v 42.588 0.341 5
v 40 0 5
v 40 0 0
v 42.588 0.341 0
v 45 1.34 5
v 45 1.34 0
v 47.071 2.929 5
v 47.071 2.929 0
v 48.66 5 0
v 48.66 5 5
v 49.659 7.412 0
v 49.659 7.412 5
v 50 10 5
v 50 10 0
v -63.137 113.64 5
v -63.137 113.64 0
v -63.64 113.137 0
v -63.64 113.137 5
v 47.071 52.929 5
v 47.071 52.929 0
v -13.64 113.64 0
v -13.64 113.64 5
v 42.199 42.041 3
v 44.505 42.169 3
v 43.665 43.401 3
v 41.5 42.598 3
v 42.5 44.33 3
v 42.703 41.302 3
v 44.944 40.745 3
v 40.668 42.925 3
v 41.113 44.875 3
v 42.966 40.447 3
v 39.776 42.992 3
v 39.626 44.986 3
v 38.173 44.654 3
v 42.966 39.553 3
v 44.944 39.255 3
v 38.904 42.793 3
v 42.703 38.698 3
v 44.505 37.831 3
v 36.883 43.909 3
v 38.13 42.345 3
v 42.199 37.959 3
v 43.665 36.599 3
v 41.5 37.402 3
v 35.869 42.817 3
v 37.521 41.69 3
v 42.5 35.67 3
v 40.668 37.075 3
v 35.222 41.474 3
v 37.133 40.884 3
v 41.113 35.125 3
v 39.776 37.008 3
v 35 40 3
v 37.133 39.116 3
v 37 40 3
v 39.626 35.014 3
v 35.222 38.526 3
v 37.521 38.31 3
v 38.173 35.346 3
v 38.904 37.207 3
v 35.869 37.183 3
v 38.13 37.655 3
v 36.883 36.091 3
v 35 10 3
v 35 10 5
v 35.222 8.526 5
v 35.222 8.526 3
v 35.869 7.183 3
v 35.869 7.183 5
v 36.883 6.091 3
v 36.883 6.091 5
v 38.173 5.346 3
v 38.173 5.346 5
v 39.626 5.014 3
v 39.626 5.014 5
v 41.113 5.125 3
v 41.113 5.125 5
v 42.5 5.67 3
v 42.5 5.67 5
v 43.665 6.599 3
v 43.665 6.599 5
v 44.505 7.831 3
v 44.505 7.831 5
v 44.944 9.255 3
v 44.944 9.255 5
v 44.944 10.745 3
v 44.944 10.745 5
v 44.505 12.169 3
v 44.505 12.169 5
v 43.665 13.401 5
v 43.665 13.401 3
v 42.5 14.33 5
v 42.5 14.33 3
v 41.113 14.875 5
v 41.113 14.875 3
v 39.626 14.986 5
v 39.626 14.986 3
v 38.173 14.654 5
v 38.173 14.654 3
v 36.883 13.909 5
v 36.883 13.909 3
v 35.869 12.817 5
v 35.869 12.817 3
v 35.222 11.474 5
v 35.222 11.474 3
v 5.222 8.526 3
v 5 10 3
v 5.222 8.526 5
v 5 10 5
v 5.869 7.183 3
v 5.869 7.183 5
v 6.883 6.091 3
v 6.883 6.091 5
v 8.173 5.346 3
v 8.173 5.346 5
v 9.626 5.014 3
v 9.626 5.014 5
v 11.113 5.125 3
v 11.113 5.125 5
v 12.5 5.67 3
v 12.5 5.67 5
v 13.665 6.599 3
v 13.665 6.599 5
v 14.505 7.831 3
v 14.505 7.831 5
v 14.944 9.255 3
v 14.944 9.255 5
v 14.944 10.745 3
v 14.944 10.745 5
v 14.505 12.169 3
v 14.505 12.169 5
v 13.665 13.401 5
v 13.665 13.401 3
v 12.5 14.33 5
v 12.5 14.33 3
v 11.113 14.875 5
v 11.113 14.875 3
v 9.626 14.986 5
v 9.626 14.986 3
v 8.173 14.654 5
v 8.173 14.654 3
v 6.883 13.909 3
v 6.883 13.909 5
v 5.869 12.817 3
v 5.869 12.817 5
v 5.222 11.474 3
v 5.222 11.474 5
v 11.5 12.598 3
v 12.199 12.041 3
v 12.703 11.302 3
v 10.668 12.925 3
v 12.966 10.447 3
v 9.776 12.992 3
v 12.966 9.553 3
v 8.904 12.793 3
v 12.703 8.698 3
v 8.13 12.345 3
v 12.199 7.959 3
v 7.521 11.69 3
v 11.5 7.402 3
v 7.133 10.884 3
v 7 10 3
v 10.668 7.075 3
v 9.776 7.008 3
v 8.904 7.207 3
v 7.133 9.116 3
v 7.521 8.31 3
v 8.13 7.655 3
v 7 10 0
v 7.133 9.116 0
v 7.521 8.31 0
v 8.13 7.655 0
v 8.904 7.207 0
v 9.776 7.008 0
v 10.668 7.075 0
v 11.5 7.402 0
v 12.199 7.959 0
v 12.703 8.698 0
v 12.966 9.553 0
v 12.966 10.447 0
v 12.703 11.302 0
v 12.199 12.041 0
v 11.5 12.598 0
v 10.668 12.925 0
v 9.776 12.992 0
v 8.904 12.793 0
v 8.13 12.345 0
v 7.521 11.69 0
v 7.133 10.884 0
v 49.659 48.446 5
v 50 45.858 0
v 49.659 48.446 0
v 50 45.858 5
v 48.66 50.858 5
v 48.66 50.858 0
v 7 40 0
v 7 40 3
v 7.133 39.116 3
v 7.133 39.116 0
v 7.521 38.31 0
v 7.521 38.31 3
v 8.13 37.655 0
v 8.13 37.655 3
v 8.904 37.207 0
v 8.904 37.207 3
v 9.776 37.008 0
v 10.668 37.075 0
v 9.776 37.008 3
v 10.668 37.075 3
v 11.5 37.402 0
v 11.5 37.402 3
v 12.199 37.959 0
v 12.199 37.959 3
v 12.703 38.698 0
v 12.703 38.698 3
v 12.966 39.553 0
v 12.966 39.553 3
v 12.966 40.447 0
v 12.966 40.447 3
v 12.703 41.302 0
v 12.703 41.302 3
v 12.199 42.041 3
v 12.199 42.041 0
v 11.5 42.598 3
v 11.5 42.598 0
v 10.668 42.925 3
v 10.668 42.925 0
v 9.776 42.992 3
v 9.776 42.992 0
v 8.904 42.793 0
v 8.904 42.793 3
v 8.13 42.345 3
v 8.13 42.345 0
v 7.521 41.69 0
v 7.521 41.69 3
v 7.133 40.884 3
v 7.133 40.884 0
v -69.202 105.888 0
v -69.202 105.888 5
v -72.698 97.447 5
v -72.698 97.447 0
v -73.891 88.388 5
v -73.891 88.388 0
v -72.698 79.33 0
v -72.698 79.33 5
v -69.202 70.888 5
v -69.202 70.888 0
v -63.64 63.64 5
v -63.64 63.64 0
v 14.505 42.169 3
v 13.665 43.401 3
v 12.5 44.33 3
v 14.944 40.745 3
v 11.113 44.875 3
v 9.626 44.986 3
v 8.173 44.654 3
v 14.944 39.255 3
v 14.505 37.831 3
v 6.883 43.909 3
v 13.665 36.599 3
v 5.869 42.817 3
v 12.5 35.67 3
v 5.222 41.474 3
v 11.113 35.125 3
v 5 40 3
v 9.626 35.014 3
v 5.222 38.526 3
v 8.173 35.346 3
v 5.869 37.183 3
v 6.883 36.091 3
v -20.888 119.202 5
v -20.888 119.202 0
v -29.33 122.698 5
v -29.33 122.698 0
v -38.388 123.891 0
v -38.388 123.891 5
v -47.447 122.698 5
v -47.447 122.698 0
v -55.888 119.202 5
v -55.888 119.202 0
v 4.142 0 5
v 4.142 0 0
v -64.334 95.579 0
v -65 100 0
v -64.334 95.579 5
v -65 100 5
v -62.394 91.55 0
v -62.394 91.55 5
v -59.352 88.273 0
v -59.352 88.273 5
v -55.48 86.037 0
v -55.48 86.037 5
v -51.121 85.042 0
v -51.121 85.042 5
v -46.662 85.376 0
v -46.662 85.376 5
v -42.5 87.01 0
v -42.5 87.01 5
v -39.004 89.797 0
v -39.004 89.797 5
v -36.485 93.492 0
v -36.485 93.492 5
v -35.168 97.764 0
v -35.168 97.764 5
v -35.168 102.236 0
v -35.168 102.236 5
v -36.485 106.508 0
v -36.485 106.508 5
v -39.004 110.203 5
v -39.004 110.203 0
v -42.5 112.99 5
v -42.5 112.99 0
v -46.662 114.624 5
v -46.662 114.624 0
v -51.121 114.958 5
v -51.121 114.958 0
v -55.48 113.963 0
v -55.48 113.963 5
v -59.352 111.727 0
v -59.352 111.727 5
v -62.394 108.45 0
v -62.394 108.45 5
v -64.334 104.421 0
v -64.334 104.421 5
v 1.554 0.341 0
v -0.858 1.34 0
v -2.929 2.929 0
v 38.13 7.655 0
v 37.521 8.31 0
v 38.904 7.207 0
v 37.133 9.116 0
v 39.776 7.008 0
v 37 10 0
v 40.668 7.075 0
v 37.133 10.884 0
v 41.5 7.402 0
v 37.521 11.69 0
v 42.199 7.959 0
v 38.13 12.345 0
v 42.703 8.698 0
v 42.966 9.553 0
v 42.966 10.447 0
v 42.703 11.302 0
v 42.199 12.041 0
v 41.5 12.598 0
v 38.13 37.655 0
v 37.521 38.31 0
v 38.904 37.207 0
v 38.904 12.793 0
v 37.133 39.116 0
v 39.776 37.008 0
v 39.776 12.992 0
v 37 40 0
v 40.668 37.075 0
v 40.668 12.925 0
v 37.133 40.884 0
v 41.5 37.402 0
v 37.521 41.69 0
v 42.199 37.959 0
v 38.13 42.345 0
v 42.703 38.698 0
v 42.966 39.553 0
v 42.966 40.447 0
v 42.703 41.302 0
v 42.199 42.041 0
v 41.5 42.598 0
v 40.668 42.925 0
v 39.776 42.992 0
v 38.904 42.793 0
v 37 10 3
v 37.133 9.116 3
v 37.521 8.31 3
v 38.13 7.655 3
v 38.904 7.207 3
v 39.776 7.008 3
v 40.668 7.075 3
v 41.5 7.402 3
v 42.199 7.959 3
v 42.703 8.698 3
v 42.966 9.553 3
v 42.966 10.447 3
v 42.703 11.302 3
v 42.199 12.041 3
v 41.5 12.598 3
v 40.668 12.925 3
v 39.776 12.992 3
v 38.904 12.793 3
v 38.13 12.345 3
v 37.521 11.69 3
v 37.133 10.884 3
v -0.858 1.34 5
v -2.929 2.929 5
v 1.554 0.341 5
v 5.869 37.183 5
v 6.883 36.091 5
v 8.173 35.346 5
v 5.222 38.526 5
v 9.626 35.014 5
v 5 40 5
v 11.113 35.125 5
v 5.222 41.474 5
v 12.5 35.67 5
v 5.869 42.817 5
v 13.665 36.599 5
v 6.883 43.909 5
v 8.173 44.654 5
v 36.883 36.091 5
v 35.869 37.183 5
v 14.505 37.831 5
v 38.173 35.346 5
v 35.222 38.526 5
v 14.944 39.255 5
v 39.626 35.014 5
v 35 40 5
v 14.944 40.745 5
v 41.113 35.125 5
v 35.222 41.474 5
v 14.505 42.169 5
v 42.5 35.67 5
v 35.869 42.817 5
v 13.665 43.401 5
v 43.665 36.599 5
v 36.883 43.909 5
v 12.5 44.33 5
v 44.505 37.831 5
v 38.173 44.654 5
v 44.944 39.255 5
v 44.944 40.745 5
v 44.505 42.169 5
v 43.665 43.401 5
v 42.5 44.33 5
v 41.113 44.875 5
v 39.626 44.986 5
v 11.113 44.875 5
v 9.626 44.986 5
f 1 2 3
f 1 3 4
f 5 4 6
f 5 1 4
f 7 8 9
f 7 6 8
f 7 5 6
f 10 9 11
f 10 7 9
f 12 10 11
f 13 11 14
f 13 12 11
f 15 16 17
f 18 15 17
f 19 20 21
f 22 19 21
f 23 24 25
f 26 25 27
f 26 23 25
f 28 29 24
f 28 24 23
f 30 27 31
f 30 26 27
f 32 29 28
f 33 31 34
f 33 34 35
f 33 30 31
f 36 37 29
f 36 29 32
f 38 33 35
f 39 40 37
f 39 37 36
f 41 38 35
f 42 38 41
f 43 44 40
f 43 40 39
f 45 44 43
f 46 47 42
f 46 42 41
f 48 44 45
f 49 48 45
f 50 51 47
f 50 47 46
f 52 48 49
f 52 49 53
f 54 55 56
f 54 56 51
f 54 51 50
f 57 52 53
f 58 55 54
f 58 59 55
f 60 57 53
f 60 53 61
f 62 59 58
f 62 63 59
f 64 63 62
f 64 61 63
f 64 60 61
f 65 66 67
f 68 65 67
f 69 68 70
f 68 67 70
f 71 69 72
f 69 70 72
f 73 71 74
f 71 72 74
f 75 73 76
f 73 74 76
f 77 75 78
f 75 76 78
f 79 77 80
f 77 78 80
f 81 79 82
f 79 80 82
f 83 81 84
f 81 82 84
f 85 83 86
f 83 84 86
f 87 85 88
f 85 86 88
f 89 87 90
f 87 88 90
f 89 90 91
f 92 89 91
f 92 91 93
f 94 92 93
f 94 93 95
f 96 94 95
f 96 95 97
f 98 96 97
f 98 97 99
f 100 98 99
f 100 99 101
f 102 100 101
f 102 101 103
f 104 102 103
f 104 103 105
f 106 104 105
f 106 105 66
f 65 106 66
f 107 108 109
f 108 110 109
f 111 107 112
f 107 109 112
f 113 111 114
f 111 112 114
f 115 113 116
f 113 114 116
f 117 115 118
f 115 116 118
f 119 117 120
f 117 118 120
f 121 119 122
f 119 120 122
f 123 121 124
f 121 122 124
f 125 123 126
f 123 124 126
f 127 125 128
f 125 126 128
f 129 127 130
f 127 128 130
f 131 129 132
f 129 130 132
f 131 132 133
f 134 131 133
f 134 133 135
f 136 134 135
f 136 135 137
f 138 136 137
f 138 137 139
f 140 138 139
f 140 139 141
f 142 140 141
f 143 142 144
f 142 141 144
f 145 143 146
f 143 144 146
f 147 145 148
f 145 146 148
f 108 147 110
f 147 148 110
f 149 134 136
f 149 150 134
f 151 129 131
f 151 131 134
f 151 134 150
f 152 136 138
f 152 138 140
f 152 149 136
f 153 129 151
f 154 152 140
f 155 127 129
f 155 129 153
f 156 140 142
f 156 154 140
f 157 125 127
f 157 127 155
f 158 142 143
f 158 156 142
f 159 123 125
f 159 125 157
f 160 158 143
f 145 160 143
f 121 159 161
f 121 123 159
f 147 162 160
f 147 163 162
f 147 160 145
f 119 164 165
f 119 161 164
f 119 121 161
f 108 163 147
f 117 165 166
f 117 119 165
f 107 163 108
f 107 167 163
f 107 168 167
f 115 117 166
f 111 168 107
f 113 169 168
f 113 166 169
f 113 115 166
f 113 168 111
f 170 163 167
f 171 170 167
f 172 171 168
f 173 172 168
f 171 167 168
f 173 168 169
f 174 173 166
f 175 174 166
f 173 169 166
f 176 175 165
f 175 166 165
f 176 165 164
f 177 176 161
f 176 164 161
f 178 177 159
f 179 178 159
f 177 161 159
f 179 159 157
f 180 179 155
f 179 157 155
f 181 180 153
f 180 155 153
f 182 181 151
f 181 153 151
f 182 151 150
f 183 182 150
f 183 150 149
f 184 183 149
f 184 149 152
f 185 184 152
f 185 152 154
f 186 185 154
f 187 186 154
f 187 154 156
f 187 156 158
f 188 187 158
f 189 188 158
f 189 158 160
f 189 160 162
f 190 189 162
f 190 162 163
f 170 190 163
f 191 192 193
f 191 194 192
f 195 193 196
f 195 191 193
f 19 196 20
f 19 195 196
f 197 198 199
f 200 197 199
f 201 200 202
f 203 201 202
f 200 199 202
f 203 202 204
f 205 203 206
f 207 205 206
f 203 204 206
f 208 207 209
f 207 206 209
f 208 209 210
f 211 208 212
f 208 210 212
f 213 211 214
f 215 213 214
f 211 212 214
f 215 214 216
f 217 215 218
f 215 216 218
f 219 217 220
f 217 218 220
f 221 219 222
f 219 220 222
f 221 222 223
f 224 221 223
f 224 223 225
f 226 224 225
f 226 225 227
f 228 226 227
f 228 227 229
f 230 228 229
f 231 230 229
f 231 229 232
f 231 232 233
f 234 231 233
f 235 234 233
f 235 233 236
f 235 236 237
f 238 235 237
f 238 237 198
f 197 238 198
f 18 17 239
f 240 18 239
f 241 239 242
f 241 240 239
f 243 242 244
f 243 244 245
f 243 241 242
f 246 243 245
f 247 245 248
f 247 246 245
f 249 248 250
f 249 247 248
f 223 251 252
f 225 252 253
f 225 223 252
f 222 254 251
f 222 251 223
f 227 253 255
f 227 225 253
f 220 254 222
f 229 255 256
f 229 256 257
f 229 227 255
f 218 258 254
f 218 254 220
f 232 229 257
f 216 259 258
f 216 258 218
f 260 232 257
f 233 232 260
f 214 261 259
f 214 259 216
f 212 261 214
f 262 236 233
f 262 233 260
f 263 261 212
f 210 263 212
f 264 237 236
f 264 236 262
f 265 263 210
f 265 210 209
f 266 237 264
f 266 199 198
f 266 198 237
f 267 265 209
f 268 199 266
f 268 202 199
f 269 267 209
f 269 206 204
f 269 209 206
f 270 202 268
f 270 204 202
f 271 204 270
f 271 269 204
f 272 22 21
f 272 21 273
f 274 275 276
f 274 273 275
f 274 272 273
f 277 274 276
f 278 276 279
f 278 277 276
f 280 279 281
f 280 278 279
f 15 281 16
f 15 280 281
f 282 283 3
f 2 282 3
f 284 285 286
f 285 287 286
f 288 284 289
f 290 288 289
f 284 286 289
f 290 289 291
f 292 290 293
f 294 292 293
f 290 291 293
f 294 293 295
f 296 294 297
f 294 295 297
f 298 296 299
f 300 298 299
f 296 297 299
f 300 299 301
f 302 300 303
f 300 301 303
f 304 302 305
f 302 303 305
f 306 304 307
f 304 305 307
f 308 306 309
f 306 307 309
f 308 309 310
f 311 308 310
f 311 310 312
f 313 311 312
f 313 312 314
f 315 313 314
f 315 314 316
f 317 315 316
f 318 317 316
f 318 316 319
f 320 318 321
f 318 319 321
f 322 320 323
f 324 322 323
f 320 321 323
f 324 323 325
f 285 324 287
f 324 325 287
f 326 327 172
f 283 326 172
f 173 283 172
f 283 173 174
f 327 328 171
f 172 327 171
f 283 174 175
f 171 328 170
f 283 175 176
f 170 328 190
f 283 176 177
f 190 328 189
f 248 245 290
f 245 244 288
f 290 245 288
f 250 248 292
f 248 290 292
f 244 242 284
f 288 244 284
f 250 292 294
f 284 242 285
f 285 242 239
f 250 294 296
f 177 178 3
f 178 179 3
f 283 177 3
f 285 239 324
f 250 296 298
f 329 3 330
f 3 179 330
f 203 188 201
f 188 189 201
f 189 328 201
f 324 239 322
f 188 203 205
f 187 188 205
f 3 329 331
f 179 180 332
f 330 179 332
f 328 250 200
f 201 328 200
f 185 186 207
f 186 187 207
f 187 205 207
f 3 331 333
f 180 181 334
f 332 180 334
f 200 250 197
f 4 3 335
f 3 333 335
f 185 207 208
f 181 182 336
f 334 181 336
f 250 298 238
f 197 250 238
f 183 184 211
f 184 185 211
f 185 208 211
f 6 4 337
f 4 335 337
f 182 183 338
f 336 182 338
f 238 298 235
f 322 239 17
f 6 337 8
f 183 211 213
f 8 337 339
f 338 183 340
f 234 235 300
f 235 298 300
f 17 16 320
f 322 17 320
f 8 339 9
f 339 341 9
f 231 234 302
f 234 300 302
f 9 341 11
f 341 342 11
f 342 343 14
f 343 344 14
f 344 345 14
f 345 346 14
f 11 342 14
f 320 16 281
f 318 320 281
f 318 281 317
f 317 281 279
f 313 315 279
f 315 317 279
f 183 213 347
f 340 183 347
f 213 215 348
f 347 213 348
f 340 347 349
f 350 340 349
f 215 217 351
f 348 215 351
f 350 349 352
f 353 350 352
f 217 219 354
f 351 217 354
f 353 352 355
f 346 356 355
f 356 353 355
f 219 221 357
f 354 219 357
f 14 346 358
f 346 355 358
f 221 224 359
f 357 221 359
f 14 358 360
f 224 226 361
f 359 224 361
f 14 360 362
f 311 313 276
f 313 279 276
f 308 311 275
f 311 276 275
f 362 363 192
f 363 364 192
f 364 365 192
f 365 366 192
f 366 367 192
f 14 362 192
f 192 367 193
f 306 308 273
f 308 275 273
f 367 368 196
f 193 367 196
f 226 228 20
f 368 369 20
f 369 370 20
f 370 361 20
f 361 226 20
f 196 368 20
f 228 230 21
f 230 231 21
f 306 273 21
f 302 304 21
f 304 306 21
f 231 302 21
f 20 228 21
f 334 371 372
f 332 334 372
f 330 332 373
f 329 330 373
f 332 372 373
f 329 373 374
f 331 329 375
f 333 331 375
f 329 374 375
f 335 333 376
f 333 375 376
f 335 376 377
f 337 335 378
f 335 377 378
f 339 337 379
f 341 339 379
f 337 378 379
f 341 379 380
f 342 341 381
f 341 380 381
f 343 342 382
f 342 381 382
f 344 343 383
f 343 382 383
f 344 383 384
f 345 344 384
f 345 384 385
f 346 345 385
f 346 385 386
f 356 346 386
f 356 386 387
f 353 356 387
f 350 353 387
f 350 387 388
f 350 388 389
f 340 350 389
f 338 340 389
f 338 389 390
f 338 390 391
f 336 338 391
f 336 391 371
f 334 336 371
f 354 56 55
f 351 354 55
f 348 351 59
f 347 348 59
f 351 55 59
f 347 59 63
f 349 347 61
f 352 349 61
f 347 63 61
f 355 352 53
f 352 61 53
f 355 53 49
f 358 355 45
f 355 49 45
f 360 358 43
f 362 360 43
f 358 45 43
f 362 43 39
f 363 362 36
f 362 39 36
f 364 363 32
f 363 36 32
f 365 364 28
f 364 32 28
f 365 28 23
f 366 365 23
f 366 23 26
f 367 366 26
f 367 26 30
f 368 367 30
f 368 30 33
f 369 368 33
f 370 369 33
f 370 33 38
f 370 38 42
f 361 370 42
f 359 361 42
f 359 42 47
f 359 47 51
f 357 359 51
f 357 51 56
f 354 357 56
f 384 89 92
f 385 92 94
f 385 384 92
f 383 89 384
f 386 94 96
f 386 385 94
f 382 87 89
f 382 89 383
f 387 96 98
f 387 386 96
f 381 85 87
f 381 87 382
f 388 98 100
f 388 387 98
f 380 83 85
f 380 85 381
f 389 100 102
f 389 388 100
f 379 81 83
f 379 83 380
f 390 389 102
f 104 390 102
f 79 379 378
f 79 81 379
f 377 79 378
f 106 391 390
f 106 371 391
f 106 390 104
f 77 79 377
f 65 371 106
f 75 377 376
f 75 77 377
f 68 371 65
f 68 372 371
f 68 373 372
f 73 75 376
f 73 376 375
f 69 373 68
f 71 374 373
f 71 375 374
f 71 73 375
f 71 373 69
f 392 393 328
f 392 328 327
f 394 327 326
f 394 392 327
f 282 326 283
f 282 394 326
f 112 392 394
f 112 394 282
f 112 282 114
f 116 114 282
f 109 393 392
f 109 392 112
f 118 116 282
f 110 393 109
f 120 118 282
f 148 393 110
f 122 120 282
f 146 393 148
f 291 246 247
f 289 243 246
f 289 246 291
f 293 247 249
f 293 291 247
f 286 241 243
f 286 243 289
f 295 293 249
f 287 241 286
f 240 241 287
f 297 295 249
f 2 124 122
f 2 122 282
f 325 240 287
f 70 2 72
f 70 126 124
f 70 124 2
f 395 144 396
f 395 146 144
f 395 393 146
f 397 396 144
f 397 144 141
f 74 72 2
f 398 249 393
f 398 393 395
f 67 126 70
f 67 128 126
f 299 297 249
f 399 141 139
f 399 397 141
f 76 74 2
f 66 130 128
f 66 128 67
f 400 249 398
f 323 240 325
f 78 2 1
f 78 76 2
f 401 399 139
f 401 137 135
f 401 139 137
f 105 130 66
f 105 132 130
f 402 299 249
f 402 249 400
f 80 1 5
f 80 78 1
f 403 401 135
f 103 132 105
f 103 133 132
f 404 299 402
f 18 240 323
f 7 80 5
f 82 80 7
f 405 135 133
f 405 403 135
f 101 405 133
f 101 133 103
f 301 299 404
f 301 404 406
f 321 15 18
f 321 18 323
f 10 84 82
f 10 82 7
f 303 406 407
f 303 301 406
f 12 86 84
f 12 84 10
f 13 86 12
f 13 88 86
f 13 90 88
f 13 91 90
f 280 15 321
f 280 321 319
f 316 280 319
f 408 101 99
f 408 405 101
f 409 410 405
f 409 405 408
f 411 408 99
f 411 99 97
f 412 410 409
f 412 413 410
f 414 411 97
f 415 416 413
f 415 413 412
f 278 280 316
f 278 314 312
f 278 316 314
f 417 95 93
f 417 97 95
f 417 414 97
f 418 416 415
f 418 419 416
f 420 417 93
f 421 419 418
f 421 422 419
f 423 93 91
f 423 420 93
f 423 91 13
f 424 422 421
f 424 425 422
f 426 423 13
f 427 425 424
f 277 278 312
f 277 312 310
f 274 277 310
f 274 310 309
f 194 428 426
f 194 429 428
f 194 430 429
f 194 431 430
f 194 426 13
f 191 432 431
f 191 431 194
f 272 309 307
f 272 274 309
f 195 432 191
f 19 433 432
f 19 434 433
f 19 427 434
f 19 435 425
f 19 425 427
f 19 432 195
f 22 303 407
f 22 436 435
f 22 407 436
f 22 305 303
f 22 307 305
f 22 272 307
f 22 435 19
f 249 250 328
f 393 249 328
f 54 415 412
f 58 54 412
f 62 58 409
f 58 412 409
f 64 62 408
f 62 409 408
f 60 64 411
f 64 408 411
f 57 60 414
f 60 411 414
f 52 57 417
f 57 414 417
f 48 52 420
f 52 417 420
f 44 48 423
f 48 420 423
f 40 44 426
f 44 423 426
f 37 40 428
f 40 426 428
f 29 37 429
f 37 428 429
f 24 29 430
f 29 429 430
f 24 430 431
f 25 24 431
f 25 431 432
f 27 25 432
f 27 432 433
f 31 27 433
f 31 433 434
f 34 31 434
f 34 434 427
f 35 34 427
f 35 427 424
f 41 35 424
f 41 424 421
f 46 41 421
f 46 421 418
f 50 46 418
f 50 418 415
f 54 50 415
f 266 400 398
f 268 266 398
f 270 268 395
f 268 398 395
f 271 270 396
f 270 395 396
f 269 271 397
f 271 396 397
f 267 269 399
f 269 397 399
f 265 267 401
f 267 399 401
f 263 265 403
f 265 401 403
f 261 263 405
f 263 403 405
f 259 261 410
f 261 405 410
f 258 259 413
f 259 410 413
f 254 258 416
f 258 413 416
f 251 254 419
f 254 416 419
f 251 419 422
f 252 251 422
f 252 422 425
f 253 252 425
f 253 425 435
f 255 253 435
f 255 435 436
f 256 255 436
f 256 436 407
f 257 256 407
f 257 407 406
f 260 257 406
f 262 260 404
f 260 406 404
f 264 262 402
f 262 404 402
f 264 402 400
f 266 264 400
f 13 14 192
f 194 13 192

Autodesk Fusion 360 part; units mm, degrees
sketch "Sketch1" plane through (0, 0, 0) normal (0, 0, 1) x (1, 0, 0)
  line L0 (0, 0) -> (50, 0)
  line L1 (50, 0) -> (50, 50)
  line L2 (50, 50) -> (0, 50)
  line L3 (0, 50) -> (0, 0)
  dimension "d1" = 50
  dimension "d2" = 50
extrude "Extrude1" add sketch "Sketch1" along normal blind 5
sketch "Sketch2" plane through (0, 0, 0) normal (0, 0, 1) x (1, 0, 0)
  line L0 (0, 0) -> (50, 50)
  line L1 (50, 50) -> (-38.3883, 138.3883)
  line L2 (-38.3883, 138.3883) -> (-88.3883, 88.3883)
  line L3 (-88.3883, 88.3883) -> (0, 0)
  dimension "d5" = 125
extrude "Extrude2" add sketch "Sketch2" along normal blind 5
sketch "Sketch3" plane through (0, 0, 5) normal (0, 0, 1) x (-1, 0, 0)
  line L0 (0, 0) -> (-50, 0)
  line L1 (-50, 0) -> (-50, -50)
  line L2 (-50, -50) -> (38.3883, -138.3883)
  line L3 (38.3883, -138.3883) -> (88.3883, -88.3883)
  line L4 (88.3883, -88.3883) -> (0, 0)
  circle A0 centre (-10, -10) radius 5
  circle A1 centre (-40, -10) radius 5
  circle A2 centre (-40, -40) radius 5
  circle A3 centre (-10, -40) radius 5
  dimension "d8" = 10
  dimension "d9" = 10
  dimension "d10" = 10
  dimension "d11" = 10
extrude "Extrude3" cut sketch "Sketch3" against normal blind 2 contours A0 | A1 | A2 | A3
sketch "Sketch4" plane through (0, 0, 3) normal (0, 0, 1) x (-1, 0, 0)
  circle A0 centre (-10, -40) radius 5
  circle A1 centre (-10, -40) radius 3
  circle A2 centre (-40, -40) radius 3
  circle A3 centre (-10, -10) radius 3
  circle A4 centre (-40, -10) radius 3
  dimension "d14" = 6
  dimension "d15" = 6
  dimension "d16" = 6
  dimension "d17" = 6
extrude "Extrude4" cut sketch "Sketch4" against normal blind 5 contours A1 | A2 | A3 | A4
sketch "Sketch5" plane through (0, 0, 5) normal (0, 0, 1) x (-1, 0, 0)
  circle A0 centre (-40, -40) radius 5
  circle A1 centre (-40, -10) radius 5
  circle A2 centre (-10, -40) radius 5
  circle A3 centre (-10, -10) radius 5
  line L0 (0, 0) -> (-50, 0)
  line L1 (-50, 0) -> (-50, -50)
  line L2 (-50, -50) -> (38.3883, -138.3883)
  line L3 (38.3883, -138.3883) -> (88.3883, -88.3883)
  line L4 (88.3883, -88.3883) -> (0, 0)
  circle A4 centre (50, -100) radius 15
  dimension "d20" = 30
extrude "Extrude5" cut sketch "Sketch5" against normal blind 5 contours A4
fillet "Fillet1" radius 35 2 edges at (-88.3883, 88.3883, 2.5) (-38.3883, 138.3883, 2.5)
fillet "Fillet2" radius 10 3 edges at (0, 0, 2.5) (50, 0, 2.5) (50, 50, 2.5)
